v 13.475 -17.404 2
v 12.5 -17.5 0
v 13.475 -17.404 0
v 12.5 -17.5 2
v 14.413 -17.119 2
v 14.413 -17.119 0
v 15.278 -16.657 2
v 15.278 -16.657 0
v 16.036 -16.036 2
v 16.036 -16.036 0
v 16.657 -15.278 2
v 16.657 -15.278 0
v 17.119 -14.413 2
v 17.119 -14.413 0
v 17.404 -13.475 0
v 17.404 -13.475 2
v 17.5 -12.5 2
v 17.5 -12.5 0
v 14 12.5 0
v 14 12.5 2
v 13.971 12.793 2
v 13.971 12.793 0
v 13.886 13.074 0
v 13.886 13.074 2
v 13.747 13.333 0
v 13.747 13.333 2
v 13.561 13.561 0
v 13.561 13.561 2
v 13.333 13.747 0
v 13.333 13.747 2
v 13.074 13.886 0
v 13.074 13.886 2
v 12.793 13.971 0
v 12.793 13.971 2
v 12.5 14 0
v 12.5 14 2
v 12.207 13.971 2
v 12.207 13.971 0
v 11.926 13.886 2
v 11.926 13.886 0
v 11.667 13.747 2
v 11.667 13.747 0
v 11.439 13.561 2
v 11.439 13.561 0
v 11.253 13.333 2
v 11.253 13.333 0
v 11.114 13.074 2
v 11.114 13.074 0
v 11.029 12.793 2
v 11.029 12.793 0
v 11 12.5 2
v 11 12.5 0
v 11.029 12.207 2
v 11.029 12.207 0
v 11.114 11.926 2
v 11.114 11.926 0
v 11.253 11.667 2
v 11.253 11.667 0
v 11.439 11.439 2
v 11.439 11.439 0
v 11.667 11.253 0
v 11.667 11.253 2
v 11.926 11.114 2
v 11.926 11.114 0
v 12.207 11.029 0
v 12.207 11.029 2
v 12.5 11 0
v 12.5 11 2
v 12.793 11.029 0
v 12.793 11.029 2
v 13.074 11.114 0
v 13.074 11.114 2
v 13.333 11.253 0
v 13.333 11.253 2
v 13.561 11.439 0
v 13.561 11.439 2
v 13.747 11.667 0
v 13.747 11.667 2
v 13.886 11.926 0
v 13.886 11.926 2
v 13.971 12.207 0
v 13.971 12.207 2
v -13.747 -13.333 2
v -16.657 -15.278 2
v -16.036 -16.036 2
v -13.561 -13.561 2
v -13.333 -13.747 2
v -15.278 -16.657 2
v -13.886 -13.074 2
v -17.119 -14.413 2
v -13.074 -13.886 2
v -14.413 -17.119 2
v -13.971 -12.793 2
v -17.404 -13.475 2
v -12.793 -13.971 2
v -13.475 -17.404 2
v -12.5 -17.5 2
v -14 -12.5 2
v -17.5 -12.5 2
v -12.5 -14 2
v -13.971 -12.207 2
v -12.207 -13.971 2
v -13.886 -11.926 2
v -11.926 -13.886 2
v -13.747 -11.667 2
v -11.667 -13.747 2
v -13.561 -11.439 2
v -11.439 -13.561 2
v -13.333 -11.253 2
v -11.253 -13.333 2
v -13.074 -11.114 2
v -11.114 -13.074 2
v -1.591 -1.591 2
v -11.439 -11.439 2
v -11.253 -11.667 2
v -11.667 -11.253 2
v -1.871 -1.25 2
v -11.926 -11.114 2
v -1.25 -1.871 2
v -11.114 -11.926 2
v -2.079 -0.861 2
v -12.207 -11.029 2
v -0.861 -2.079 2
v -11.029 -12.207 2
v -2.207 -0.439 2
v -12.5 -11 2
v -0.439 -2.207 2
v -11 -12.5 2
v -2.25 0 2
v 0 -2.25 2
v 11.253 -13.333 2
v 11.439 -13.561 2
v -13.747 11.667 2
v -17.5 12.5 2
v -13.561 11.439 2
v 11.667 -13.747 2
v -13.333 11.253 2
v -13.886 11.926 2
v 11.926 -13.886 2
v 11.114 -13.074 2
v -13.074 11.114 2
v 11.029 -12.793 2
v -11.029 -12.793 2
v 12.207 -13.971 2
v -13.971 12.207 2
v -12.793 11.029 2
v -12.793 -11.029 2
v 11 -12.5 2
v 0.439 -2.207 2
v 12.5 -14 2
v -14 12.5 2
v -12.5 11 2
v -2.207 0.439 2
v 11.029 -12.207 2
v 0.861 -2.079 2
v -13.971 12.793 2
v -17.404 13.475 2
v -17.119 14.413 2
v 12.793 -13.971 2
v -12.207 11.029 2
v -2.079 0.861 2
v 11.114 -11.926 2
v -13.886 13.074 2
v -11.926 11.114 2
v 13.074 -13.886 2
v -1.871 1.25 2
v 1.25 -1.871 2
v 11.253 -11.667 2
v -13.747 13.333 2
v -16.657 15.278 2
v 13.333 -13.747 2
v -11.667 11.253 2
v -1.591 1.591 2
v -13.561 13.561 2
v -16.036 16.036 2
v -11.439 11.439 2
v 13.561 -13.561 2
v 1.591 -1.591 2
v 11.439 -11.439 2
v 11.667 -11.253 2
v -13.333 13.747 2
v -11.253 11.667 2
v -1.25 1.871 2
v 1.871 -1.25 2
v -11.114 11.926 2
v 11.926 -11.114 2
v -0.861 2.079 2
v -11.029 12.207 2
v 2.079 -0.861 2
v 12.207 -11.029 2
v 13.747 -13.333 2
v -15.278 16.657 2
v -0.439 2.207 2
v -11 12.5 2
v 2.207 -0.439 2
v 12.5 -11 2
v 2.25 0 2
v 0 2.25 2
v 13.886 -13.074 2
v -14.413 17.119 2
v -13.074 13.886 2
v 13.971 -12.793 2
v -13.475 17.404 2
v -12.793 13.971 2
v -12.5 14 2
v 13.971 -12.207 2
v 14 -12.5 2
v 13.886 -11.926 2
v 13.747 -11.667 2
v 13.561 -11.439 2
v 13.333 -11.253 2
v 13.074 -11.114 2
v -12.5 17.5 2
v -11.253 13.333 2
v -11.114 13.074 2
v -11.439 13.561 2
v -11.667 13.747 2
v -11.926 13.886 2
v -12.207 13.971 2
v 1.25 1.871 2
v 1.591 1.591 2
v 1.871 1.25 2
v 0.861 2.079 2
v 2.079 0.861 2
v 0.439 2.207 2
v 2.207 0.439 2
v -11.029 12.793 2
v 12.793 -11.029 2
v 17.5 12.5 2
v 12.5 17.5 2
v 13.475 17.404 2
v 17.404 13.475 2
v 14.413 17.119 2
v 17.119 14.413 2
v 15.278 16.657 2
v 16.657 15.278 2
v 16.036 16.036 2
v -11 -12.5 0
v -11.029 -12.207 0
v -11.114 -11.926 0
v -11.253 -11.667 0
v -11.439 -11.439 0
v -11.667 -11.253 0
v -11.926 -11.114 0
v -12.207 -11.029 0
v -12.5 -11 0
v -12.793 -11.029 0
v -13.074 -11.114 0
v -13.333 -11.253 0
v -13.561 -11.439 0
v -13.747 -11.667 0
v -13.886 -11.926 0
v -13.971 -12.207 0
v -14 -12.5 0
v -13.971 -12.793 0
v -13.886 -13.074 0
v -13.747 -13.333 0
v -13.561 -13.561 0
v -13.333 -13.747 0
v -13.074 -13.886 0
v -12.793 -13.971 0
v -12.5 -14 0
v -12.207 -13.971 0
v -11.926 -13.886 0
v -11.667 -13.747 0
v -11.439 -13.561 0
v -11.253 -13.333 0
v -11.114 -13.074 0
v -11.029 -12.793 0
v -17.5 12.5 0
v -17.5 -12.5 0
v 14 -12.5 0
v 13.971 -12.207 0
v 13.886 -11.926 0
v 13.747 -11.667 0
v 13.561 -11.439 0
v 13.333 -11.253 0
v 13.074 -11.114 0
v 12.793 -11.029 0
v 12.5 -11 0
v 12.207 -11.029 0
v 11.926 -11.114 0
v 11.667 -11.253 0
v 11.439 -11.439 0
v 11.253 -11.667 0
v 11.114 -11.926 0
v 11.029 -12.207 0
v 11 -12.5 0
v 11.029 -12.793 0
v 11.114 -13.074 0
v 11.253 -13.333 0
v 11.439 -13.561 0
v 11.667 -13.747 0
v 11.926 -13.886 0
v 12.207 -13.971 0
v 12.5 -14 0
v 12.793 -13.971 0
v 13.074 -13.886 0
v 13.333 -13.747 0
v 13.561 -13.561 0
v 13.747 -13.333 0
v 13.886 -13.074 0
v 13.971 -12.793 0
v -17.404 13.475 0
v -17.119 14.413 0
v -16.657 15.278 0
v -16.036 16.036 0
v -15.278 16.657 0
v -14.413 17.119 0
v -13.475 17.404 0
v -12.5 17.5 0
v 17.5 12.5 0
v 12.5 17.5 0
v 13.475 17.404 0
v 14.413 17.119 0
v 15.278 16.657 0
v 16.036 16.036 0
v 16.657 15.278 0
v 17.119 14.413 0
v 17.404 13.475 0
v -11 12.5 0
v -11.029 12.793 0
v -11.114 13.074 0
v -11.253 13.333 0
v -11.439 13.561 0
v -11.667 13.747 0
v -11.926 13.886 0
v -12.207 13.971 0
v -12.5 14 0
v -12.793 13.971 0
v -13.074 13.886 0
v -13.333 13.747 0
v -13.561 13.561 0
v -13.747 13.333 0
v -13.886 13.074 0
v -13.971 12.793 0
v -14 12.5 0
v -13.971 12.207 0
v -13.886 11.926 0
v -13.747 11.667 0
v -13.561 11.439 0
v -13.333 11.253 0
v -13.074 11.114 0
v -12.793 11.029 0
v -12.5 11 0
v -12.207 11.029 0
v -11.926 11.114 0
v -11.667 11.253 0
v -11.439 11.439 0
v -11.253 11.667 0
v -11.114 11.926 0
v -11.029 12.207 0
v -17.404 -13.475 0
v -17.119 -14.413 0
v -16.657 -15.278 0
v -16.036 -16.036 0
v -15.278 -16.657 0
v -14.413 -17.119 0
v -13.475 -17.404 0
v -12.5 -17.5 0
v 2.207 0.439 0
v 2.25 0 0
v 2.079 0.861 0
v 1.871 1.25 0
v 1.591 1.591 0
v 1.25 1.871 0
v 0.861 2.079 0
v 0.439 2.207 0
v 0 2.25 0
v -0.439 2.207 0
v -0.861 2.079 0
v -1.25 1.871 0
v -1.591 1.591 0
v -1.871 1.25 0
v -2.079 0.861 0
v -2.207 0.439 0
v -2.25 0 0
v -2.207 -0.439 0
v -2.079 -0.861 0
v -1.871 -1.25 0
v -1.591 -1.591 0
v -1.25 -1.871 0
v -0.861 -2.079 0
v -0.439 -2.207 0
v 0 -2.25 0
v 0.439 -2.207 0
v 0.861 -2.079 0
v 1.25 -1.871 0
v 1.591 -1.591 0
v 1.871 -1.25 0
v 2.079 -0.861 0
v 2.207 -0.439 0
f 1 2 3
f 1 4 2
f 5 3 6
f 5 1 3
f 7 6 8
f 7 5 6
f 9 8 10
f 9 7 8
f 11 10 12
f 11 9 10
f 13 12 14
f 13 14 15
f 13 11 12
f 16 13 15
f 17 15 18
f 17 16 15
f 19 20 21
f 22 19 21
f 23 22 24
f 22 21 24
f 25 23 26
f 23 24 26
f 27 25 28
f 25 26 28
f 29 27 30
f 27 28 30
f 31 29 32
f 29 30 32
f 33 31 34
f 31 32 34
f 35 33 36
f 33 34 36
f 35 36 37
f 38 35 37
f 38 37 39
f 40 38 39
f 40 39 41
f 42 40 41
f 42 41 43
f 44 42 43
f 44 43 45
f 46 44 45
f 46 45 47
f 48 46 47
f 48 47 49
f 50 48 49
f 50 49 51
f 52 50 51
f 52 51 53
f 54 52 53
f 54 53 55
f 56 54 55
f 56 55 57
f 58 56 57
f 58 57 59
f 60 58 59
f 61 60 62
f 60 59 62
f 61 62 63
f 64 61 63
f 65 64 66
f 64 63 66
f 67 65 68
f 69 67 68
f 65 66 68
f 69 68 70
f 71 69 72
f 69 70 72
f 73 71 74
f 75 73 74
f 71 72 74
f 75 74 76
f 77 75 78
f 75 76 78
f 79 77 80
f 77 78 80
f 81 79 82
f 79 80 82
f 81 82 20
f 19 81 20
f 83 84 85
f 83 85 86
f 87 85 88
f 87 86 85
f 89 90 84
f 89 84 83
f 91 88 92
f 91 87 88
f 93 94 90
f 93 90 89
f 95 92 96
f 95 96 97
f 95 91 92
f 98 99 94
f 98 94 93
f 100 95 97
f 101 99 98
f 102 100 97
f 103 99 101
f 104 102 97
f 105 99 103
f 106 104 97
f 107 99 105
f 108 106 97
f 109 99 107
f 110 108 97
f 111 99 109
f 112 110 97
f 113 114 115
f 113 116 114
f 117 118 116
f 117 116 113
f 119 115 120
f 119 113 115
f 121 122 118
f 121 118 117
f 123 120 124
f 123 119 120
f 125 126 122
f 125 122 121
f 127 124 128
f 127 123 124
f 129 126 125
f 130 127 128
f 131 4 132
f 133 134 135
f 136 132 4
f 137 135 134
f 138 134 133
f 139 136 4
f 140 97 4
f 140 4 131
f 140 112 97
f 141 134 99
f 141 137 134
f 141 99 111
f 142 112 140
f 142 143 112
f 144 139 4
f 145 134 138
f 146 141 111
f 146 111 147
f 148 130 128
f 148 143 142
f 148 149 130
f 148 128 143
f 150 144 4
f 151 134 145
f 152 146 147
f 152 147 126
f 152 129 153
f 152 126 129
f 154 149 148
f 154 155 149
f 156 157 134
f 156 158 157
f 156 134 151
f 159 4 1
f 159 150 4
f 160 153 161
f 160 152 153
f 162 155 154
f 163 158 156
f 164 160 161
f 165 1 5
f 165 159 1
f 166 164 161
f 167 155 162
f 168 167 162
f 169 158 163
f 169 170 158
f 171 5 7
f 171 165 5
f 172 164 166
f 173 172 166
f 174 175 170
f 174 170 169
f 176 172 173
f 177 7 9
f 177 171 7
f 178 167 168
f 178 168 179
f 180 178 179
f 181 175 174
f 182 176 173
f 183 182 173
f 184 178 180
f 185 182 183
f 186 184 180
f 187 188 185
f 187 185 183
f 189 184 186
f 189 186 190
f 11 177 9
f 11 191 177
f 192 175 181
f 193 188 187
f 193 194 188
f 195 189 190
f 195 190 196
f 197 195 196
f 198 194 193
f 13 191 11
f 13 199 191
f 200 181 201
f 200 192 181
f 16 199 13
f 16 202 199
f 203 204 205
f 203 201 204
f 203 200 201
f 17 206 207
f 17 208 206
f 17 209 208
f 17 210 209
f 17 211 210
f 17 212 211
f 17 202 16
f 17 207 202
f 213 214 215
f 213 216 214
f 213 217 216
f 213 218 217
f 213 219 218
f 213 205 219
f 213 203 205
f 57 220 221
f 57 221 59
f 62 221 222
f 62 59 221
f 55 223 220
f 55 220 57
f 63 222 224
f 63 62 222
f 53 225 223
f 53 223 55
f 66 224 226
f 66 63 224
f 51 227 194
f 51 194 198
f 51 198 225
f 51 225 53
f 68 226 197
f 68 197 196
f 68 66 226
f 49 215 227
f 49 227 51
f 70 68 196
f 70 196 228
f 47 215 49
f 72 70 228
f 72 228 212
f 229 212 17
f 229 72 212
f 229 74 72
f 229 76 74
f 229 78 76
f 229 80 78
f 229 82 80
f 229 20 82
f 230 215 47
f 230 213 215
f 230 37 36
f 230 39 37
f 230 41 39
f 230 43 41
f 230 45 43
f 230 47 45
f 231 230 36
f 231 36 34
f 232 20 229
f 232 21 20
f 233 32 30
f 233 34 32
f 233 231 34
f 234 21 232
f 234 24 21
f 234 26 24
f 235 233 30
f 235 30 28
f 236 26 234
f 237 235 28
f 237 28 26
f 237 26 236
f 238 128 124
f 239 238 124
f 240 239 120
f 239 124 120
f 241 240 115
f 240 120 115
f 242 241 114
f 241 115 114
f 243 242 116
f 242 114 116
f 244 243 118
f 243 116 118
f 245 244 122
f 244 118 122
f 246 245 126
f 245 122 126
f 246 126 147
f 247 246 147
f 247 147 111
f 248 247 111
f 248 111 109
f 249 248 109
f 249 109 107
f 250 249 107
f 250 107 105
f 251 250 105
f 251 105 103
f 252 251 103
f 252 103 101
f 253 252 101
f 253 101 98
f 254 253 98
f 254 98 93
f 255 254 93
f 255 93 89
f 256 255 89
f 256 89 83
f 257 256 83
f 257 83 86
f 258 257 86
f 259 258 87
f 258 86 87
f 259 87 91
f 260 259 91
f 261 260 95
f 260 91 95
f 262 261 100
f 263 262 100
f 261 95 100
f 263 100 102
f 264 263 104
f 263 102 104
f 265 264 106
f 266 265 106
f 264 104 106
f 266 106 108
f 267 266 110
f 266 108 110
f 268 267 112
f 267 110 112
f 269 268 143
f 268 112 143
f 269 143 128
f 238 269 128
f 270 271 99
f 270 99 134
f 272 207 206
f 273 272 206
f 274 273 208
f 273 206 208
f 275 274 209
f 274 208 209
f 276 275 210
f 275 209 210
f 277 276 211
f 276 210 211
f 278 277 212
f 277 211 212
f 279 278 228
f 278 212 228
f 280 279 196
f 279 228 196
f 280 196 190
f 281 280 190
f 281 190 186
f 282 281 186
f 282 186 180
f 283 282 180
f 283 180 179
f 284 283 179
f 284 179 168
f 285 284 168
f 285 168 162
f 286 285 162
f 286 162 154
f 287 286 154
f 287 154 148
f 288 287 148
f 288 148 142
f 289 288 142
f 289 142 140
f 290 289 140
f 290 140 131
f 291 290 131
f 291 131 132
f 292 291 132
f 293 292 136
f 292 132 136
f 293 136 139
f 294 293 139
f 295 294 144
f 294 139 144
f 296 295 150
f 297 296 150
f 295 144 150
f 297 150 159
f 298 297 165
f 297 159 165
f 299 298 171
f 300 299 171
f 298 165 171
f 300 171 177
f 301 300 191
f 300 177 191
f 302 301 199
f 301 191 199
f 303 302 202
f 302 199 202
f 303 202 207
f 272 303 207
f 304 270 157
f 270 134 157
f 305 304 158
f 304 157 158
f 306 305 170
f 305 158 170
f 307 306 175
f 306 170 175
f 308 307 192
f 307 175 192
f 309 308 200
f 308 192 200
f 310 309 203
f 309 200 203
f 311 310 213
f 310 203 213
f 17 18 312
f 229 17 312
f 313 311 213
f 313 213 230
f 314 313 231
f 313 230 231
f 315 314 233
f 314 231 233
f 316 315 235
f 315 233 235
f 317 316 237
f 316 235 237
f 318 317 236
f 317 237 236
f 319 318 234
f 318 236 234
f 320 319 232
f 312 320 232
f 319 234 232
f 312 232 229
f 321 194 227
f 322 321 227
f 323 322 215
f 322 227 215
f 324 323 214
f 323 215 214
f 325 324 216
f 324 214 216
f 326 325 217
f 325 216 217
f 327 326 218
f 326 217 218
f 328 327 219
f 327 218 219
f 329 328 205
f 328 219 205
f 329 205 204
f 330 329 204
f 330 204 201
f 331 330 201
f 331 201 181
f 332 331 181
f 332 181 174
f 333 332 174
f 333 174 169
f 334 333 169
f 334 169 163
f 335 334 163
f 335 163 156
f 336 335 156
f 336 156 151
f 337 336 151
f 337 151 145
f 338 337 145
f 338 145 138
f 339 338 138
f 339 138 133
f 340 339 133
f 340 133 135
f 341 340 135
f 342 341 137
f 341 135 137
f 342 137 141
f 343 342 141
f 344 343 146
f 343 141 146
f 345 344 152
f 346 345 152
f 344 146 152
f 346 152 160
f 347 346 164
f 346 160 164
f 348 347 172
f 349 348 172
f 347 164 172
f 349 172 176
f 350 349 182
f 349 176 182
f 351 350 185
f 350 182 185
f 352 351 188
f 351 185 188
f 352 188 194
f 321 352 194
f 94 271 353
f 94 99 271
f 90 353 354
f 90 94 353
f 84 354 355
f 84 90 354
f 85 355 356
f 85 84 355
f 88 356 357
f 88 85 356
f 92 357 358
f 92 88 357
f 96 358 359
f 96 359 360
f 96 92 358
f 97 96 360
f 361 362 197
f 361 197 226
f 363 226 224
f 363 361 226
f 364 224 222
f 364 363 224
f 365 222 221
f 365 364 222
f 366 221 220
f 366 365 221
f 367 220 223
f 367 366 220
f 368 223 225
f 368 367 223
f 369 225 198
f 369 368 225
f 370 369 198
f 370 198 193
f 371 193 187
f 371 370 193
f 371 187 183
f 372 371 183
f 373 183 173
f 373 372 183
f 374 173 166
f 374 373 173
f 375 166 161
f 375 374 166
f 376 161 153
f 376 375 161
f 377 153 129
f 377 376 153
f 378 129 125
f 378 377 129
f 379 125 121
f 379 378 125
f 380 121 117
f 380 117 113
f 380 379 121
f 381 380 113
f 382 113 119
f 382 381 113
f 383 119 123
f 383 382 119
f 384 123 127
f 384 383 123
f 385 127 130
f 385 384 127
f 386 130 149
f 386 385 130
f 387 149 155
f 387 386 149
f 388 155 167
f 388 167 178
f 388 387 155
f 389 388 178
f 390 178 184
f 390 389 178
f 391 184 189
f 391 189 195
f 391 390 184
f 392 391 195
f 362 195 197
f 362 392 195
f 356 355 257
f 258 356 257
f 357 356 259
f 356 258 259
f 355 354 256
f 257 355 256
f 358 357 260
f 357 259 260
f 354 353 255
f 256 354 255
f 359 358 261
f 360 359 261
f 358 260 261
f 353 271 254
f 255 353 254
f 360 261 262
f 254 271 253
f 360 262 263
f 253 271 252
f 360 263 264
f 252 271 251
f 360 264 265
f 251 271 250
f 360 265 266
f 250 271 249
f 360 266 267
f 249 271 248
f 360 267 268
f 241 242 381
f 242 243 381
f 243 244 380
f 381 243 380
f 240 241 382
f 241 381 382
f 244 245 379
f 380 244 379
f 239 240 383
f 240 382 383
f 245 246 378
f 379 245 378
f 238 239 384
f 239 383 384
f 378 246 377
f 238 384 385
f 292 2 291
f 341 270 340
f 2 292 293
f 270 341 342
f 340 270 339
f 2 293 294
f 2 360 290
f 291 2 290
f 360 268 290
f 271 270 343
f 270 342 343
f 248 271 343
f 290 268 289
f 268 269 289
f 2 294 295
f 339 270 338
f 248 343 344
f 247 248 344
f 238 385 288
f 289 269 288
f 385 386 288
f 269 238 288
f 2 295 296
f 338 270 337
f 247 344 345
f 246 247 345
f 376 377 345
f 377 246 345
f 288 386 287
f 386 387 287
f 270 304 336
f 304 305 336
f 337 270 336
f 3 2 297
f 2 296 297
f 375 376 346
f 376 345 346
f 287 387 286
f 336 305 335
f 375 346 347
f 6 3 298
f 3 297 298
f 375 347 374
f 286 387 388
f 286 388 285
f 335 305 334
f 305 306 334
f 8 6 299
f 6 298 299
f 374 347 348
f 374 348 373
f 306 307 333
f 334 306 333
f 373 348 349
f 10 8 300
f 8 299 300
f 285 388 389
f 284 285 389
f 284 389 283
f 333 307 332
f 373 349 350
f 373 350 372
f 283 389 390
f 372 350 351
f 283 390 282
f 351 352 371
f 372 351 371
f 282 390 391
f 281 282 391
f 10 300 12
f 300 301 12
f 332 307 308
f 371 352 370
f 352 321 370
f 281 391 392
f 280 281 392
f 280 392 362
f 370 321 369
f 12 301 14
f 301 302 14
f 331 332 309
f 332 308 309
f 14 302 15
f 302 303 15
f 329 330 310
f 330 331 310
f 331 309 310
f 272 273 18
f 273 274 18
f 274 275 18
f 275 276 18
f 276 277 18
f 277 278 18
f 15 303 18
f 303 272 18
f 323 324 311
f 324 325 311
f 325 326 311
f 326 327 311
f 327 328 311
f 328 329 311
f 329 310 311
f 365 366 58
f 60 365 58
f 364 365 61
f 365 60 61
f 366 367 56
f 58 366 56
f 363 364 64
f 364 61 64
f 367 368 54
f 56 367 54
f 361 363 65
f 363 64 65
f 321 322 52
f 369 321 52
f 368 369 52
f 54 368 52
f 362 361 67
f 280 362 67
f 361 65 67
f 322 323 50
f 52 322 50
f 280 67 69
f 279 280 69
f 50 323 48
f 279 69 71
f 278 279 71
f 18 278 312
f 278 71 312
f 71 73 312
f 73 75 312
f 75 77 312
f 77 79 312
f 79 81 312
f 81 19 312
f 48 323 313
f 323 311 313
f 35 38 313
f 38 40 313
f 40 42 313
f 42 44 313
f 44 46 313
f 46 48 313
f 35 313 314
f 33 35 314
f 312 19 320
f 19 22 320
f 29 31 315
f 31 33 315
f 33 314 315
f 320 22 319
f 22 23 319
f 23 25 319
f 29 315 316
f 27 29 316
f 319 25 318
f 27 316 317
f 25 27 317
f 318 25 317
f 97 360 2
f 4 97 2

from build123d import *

# Parameters (mm, degrees)
CROQUIS1_W              = 35
CROQUIS1_H              = 35
CROQUIS1_R              = 2.25
SALIENTE_EXTRUIR1_DEPTH = 2
REDONDEO1_R             = 5
CROQUIS2_R              = 1.5
CORTAR_EXTRUIR1_DEPTH   = 25.829418036


with BuildPart() as part:
    # Croquis1 → Saliente-Extruir1 (new body)
    with BuildSketch(Plane.XY):
        Rectangle(CROQUIS1_W, CROQUIS1_H)
        Circle(CROQUIS1_R, mode=Mode.SUBTRACT)
    extrude(amount=SALIENTE_EXTRUIR1_DEPTH)

    # Redondeo1
    redondeo1_edges = [part.edges().sort_by_distance(p)[0] for p in [
        (17.5, -17.5, 1),
        (-17.5, -17.5, 1),
        (-17.5, 17.5, 1),
        (17.5, 17.5, 1),
    ]]
    fillet(redondeo1_edges, radius=REDONDEO1_R)

    # Croquis2 → Cortar-Extruir1 (cut, through all)
    with BuildSketch(Plane.XY.offset(2)):
        with Locations((-12.5, 12.5)):
            Circle(CROQUIS2_R)
        with Locations((12.5, 12.5)):
            Circle(CROQUIS2_R)
        with Locations((12.5, -12.5)):
            Circle(CROQUIS2_R)
        with Locations((-12.5, -12.5)):
            Circle(CROQUIS2_R)
    extrude(amount=-CORTAR_EXTRUIR1_DEPTH, mode=Mode.SUBTRACT)


solid = part.part
